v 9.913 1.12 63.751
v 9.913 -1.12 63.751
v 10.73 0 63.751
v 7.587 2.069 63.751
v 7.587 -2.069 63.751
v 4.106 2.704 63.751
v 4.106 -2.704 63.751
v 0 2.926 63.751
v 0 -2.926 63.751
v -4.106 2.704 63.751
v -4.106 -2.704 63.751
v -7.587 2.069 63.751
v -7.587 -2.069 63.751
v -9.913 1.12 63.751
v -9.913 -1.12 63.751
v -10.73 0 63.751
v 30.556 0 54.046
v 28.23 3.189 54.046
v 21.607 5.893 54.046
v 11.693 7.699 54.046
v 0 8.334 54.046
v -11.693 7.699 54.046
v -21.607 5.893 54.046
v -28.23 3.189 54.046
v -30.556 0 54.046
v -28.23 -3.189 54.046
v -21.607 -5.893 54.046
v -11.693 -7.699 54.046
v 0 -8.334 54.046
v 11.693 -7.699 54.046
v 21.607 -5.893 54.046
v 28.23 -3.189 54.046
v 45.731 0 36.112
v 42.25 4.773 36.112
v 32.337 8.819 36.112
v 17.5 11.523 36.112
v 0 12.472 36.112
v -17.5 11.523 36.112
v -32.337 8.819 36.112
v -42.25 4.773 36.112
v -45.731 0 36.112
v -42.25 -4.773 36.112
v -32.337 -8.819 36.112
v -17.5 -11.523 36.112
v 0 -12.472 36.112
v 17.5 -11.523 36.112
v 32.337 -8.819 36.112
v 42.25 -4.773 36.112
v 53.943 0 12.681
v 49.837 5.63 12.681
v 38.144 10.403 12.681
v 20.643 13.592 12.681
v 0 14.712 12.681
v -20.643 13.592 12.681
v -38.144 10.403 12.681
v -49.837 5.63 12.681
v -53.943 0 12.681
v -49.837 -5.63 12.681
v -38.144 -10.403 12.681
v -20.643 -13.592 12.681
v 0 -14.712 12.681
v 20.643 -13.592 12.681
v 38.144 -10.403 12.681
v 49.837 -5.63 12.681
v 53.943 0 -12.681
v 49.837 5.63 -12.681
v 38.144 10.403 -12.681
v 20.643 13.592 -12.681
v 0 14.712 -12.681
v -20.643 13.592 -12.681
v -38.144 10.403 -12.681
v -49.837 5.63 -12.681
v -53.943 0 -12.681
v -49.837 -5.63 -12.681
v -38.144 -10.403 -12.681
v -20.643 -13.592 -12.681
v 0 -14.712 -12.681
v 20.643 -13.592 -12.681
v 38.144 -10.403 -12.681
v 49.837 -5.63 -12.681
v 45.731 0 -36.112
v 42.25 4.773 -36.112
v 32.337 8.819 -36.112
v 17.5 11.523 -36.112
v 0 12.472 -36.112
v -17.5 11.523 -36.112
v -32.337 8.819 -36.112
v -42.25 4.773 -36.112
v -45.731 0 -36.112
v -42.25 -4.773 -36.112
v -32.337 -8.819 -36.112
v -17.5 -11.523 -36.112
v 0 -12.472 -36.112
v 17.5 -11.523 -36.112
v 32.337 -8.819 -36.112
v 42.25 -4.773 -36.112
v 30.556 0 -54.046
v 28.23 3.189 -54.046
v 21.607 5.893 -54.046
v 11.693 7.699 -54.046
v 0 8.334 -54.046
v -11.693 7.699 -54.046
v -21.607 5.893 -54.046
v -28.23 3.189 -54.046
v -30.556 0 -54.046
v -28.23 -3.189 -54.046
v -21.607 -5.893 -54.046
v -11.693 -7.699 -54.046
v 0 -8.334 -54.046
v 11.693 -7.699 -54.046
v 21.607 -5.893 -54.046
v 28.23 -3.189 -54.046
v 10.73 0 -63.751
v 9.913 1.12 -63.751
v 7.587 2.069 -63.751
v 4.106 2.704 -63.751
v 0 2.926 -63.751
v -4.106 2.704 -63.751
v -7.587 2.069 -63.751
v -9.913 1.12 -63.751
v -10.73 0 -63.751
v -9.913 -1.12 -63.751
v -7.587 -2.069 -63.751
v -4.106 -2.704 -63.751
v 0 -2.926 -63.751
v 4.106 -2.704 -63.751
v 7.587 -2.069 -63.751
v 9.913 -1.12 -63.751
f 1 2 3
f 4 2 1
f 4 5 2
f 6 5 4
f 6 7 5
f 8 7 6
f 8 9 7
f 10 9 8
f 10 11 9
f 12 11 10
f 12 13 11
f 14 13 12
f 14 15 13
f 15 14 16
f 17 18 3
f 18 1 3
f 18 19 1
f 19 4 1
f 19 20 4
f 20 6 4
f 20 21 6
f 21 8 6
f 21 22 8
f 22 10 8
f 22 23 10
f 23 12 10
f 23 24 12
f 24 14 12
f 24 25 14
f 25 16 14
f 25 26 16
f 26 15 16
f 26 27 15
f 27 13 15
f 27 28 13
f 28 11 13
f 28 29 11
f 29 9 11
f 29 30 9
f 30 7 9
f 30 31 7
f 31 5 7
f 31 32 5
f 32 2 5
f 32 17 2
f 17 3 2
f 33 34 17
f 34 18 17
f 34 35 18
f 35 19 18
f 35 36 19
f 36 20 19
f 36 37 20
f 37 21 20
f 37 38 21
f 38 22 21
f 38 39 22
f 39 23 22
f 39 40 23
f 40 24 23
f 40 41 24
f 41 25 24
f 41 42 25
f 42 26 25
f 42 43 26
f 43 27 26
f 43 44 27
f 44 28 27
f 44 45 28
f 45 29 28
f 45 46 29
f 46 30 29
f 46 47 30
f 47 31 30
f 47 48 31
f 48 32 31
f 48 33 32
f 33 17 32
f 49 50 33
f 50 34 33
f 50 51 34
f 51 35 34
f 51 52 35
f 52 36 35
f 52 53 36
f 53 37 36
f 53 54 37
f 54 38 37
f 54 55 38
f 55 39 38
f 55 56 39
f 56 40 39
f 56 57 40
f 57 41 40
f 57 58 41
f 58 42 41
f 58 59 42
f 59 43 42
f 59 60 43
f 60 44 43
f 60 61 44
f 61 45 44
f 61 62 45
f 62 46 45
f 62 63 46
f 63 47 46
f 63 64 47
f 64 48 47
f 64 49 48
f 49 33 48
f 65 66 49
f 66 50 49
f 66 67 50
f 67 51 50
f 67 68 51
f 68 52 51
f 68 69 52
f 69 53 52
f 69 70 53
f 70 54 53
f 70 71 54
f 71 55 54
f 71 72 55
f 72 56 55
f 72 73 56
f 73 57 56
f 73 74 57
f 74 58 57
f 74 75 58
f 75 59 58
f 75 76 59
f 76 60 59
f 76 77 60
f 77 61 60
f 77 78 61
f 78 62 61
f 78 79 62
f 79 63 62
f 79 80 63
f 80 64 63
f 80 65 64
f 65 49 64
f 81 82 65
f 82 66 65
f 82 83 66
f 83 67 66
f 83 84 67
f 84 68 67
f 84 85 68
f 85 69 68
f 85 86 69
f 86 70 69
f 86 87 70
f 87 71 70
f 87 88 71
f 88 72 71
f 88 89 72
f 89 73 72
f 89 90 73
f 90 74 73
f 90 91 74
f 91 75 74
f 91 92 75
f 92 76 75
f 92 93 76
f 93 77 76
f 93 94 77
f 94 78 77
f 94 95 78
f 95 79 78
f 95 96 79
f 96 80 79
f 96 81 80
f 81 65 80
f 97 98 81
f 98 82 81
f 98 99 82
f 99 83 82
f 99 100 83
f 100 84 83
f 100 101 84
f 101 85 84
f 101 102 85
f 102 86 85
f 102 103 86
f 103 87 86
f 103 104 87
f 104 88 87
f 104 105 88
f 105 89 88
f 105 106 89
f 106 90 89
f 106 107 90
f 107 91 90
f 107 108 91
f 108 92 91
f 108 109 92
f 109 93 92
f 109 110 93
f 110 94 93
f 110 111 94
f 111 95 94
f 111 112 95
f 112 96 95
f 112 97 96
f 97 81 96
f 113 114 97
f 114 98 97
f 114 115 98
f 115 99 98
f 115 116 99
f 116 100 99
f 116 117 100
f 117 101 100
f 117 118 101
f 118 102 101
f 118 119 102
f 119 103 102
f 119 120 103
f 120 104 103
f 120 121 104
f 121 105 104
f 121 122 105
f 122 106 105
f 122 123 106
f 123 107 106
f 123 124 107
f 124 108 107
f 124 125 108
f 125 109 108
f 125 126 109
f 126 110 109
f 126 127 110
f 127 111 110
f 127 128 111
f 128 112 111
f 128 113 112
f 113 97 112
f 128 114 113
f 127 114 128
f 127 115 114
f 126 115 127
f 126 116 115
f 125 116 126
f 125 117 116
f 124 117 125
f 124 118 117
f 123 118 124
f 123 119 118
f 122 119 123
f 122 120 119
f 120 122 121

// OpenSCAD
// Generated by SolidPython 1.0.1 on 2020-07-29 00:46:49


scale(v = [11, 3, 13]) {
	sphere(r = 5);
}
/***********************************************
*********      SolidPython code:      **********
************************************************
 
# import packages: SolidPython
from solid import *
from solid.utils import *
from itertools import chain, combinations, permutations


class Resize:

    def __init__(self, scad_file):
        self.scad_file = scad_file
        #self.scad_file = import_scad(scad_file)
        # cone/cylinder param:
        self.r1 = 0
        self.r2 = 0
        self.h = 0
        # rectangular prism param:
        self.w = 0
        self.l = 0
        # ellipse param:
        self.r = 0

    # import OpenScad code (file name corresponds to shape)


    # classify shape + parameters
    def assign(self, param1, param2, param3):
        if self.scad_file == 'cone.scad':
            self.r1 = param1
            self.r2 = param2
            self.h = param3
        elif self.scad_file == 'cylinder.scad':
            self.r1 = param1
            self.r2 = param2
            self.h = param3
        elif self.scad_file == 'rectangularPrism.scad':
            self.h = param1
            self.l = param2
            self.w = param3
        else:
            self.r = param1
            self.h = param2

    # resize parameters
    def iterate(self):
        x = range(3, 20, 2)
        i = 1
        if self.scad_file == 'cone.scad':
            tempList = list(permutations(x, 2))
            for temp in tempList:
                param1 = temp[0]
                param2 = temp[1]
                filepath = 'produced_scad_files/' + 'cone' + str(param1) + '_' + str(param2) + '_' + '.scad'
                scad_render_to_file(cylinder(h=param1, r1=param2, r2=0), filepath)

        elif self.scad_file == 'cylinder.scad':
            tempList = list(permutations(x, 3))
            for temp in tempList:
                param1 = temp[0]
                param2 = temp[1]
                filepath = 'produced_scad_files/' + 'cylinder' + str(param1) + '_' + str(param2) + '_' + '.scad'
                scad_render_to_file(cylinder(h=param1, r1=param2, r2=param2), filepath)

        elif self.scad_file == 'rectangularPrism.scad':
            tempList = list(permutations(x, 3))
            for temp in tempList:
                param1 = temp[0]
                param2 = temp[1]
                param3 = temp[2]
                filepath = 'produced_scad_files/' + 'rectangularPrism' + str(param1) + '_' + str(param2) + '_' + str(
                    param3) + '.scad'
                scad_render_to_file(cube(size=(param1, param2, param3)), filepath)

        elif self.scad_file == 'ellipse.scad':
            tempList = list(permutations(x, 4))
            for temp in tempList:
                param1 = temp[0]
                param2 = temp[1]
                param3 = temp[2]
                param4 = temp[3]
                filepath = 'produced_scad_files/' + 'ellipse' + str(param1) + '_' + str(param2) + '_' + str(param3) + '_' + str(param4) + '.scad'
                scad_render_to_file(scale([param1, param2, param3])(sphere(r=param4)), filepath)

    def render_to_scadfile(self):
        scad_render_to_file(scad, 'example.scad') 
 
************************************************/
